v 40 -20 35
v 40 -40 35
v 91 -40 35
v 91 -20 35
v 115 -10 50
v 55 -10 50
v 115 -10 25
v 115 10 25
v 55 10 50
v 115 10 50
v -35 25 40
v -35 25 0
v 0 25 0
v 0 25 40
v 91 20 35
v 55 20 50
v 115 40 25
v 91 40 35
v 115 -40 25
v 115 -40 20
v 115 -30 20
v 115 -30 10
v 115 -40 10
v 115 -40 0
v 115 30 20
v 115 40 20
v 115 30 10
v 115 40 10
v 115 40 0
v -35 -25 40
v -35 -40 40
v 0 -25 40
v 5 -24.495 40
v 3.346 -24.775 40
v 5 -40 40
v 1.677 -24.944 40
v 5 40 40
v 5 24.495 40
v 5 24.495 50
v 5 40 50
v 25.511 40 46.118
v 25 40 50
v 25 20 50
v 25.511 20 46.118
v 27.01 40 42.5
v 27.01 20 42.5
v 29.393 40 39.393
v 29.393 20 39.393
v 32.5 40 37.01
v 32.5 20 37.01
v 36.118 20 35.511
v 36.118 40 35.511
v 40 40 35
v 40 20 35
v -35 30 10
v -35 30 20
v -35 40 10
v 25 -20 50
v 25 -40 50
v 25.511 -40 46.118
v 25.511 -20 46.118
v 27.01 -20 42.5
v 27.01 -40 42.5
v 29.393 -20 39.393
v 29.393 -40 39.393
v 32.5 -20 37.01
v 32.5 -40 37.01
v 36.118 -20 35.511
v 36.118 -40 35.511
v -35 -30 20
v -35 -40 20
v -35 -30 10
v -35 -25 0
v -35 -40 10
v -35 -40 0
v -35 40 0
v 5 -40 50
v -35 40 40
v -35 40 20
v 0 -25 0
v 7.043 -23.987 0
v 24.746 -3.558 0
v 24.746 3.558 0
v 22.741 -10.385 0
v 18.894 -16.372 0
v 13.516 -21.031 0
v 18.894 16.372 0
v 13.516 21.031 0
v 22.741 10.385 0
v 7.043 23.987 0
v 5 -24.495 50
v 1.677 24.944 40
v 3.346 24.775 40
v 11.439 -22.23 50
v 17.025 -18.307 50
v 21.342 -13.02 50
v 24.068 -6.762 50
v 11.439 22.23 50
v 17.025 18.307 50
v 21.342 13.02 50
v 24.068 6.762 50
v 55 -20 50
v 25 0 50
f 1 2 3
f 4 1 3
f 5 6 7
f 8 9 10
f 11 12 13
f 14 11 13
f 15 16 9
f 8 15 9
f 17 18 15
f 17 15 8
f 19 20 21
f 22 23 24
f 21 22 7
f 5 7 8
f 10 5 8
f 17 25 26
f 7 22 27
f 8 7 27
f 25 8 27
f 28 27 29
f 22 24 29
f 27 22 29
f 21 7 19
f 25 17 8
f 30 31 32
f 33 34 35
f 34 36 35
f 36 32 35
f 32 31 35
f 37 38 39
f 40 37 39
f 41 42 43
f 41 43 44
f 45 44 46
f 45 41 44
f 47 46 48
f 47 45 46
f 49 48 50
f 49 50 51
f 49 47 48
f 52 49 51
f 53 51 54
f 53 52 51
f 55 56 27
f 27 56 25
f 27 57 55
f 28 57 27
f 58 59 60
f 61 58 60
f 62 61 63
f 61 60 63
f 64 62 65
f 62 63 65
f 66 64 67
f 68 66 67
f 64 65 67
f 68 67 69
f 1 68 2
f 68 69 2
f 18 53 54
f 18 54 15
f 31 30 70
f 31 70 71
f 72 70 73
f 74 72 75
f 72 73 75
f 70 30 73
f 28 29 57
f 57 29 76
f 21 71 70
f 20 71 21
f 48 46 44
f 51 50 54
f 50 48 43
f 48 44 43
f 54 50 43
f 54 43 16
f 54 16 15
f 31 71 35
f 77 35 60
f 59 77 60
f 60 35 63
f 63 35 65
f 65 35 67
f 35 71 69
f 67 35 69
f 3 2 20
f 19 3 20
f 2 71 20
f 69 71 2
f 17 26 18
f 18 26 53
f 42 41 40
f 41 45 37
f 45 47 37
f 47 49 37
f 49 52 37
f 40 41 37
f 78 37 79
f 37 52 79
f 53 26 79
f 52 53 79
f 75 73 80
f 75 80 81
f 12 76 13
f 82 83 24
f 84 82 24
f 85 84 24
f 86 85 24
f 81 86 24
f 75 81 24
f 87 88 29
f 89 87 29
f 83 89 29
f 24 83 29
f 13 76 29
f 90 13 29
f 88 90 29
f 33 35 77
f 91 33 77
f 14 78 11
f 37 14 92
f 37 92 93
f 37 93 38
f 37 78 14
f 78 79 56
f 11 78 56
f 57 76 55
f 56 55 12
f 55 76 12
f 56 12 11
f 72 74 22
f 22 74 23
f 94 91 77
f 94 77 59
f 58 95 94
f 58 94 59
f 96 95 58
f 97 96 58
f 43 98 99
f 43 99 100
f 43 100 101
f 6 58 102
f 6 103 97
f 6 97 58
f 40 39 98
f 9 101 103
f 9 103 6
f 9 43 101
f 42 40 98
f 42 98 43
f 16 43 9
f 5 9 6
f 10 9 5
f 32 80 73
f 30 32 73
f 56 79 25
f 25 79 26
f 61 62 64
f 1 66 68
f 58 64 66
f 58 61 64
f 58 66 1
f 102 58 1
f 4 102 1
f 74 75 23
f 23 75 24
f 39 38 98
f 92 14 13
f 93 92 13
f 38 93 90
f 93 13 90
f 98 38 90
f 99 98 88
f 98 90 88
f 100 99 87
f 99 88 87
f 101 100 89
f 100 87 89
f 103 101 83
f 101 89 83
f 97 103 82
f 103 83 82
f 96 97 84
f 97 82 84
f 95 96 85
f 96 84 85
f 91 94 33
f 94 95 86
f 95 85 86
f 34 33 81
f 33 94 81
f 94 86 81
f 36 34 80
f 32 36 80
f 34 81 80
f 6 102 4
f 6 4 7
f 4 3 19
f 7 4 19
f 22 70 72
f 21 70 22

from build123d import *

# Parameters (mm, degrees)
F1_DEPTH = 50
F2_W     = 40
F2_H     = 10
F3_DEPTH = 30
F2_W_2   = 150
F4_DEPTH = 10
F5_DEPTH = 20


# Not quite as in the source:
# - a pattern or mirror of a feature is missing from the dataset's text; its kind, count and spacing are read off the source's solid


with BuildPart() as f1:
    # F0 (on Top) → F1 (new body)
    with BuildSketch(Plane.XY):
        with BuildLine():
            Line((-35, -25), (-35, -40))
            Line((-35, -40), (115, -40))
            Line((115, -40), (115, 40))
            Line((115, 40), (-35, 40))
            Line((-35, 40), (-35, 25))
            Line((-35, 25), (0, 25))
            ThreePointArc((0, 25), (25, 0), (0, -25))
            Line((0, -25), (-35, -25))
        make_face()
    extrude(amount=F1_DEPTH)

    # F2 (on face) → F3 (cut)
    with BuildSketch(Plane.XZ.offset(40)):
        with Locations((-15, 45)):
            Rectangle(F2_W, F2_H)
        Polygon((115, 50), (55, 50), (91, 35), (115, 25), align=None)
    f3 = extrude(amount=-F3_DEPTH, mode=Mode.SUBTRACT)

    # F3_copies: F3 across plane
    add(f3.mirror(Plane.ZX), mode=Mode.SUBTRACT)

    # F2 (on face) → F4 (cut)
    with BuildSketch(Plane.XZ.offset(40)):
        with Locations((40, 15)):
            Rectangle(F2_W_2, F2_H)
    f4 = extrude(amount=-F4_DEPTH, mode=Mode.SUBTRACT)

    # F4_copies: F4 across plane
    add(f4.mirror(Plane.ZX), mode=Mode.SUBTRACT)

    # F2 (on face) → F5 (cut)
    with BuildSketch(Plane.XZ.offset(40)):
        with BuildLine():
            Line((55, 50), (25, 50))
            ThreePointArc((25, 50), (29.3933982822, 39.3933982822), (40, 35))
            Line((40, 35), (91, 35))
            Line((91, 35), (55, 50))
        make_face()
    f5 = extrude(amount=-F5_DEPTH, mode=Mode.SUBTRACT)

    # F5_copies: F5 across plane
    add(f5.mirror(Plane.ZX), mode=Mode.SUBTRACT)


solid = f1.part
